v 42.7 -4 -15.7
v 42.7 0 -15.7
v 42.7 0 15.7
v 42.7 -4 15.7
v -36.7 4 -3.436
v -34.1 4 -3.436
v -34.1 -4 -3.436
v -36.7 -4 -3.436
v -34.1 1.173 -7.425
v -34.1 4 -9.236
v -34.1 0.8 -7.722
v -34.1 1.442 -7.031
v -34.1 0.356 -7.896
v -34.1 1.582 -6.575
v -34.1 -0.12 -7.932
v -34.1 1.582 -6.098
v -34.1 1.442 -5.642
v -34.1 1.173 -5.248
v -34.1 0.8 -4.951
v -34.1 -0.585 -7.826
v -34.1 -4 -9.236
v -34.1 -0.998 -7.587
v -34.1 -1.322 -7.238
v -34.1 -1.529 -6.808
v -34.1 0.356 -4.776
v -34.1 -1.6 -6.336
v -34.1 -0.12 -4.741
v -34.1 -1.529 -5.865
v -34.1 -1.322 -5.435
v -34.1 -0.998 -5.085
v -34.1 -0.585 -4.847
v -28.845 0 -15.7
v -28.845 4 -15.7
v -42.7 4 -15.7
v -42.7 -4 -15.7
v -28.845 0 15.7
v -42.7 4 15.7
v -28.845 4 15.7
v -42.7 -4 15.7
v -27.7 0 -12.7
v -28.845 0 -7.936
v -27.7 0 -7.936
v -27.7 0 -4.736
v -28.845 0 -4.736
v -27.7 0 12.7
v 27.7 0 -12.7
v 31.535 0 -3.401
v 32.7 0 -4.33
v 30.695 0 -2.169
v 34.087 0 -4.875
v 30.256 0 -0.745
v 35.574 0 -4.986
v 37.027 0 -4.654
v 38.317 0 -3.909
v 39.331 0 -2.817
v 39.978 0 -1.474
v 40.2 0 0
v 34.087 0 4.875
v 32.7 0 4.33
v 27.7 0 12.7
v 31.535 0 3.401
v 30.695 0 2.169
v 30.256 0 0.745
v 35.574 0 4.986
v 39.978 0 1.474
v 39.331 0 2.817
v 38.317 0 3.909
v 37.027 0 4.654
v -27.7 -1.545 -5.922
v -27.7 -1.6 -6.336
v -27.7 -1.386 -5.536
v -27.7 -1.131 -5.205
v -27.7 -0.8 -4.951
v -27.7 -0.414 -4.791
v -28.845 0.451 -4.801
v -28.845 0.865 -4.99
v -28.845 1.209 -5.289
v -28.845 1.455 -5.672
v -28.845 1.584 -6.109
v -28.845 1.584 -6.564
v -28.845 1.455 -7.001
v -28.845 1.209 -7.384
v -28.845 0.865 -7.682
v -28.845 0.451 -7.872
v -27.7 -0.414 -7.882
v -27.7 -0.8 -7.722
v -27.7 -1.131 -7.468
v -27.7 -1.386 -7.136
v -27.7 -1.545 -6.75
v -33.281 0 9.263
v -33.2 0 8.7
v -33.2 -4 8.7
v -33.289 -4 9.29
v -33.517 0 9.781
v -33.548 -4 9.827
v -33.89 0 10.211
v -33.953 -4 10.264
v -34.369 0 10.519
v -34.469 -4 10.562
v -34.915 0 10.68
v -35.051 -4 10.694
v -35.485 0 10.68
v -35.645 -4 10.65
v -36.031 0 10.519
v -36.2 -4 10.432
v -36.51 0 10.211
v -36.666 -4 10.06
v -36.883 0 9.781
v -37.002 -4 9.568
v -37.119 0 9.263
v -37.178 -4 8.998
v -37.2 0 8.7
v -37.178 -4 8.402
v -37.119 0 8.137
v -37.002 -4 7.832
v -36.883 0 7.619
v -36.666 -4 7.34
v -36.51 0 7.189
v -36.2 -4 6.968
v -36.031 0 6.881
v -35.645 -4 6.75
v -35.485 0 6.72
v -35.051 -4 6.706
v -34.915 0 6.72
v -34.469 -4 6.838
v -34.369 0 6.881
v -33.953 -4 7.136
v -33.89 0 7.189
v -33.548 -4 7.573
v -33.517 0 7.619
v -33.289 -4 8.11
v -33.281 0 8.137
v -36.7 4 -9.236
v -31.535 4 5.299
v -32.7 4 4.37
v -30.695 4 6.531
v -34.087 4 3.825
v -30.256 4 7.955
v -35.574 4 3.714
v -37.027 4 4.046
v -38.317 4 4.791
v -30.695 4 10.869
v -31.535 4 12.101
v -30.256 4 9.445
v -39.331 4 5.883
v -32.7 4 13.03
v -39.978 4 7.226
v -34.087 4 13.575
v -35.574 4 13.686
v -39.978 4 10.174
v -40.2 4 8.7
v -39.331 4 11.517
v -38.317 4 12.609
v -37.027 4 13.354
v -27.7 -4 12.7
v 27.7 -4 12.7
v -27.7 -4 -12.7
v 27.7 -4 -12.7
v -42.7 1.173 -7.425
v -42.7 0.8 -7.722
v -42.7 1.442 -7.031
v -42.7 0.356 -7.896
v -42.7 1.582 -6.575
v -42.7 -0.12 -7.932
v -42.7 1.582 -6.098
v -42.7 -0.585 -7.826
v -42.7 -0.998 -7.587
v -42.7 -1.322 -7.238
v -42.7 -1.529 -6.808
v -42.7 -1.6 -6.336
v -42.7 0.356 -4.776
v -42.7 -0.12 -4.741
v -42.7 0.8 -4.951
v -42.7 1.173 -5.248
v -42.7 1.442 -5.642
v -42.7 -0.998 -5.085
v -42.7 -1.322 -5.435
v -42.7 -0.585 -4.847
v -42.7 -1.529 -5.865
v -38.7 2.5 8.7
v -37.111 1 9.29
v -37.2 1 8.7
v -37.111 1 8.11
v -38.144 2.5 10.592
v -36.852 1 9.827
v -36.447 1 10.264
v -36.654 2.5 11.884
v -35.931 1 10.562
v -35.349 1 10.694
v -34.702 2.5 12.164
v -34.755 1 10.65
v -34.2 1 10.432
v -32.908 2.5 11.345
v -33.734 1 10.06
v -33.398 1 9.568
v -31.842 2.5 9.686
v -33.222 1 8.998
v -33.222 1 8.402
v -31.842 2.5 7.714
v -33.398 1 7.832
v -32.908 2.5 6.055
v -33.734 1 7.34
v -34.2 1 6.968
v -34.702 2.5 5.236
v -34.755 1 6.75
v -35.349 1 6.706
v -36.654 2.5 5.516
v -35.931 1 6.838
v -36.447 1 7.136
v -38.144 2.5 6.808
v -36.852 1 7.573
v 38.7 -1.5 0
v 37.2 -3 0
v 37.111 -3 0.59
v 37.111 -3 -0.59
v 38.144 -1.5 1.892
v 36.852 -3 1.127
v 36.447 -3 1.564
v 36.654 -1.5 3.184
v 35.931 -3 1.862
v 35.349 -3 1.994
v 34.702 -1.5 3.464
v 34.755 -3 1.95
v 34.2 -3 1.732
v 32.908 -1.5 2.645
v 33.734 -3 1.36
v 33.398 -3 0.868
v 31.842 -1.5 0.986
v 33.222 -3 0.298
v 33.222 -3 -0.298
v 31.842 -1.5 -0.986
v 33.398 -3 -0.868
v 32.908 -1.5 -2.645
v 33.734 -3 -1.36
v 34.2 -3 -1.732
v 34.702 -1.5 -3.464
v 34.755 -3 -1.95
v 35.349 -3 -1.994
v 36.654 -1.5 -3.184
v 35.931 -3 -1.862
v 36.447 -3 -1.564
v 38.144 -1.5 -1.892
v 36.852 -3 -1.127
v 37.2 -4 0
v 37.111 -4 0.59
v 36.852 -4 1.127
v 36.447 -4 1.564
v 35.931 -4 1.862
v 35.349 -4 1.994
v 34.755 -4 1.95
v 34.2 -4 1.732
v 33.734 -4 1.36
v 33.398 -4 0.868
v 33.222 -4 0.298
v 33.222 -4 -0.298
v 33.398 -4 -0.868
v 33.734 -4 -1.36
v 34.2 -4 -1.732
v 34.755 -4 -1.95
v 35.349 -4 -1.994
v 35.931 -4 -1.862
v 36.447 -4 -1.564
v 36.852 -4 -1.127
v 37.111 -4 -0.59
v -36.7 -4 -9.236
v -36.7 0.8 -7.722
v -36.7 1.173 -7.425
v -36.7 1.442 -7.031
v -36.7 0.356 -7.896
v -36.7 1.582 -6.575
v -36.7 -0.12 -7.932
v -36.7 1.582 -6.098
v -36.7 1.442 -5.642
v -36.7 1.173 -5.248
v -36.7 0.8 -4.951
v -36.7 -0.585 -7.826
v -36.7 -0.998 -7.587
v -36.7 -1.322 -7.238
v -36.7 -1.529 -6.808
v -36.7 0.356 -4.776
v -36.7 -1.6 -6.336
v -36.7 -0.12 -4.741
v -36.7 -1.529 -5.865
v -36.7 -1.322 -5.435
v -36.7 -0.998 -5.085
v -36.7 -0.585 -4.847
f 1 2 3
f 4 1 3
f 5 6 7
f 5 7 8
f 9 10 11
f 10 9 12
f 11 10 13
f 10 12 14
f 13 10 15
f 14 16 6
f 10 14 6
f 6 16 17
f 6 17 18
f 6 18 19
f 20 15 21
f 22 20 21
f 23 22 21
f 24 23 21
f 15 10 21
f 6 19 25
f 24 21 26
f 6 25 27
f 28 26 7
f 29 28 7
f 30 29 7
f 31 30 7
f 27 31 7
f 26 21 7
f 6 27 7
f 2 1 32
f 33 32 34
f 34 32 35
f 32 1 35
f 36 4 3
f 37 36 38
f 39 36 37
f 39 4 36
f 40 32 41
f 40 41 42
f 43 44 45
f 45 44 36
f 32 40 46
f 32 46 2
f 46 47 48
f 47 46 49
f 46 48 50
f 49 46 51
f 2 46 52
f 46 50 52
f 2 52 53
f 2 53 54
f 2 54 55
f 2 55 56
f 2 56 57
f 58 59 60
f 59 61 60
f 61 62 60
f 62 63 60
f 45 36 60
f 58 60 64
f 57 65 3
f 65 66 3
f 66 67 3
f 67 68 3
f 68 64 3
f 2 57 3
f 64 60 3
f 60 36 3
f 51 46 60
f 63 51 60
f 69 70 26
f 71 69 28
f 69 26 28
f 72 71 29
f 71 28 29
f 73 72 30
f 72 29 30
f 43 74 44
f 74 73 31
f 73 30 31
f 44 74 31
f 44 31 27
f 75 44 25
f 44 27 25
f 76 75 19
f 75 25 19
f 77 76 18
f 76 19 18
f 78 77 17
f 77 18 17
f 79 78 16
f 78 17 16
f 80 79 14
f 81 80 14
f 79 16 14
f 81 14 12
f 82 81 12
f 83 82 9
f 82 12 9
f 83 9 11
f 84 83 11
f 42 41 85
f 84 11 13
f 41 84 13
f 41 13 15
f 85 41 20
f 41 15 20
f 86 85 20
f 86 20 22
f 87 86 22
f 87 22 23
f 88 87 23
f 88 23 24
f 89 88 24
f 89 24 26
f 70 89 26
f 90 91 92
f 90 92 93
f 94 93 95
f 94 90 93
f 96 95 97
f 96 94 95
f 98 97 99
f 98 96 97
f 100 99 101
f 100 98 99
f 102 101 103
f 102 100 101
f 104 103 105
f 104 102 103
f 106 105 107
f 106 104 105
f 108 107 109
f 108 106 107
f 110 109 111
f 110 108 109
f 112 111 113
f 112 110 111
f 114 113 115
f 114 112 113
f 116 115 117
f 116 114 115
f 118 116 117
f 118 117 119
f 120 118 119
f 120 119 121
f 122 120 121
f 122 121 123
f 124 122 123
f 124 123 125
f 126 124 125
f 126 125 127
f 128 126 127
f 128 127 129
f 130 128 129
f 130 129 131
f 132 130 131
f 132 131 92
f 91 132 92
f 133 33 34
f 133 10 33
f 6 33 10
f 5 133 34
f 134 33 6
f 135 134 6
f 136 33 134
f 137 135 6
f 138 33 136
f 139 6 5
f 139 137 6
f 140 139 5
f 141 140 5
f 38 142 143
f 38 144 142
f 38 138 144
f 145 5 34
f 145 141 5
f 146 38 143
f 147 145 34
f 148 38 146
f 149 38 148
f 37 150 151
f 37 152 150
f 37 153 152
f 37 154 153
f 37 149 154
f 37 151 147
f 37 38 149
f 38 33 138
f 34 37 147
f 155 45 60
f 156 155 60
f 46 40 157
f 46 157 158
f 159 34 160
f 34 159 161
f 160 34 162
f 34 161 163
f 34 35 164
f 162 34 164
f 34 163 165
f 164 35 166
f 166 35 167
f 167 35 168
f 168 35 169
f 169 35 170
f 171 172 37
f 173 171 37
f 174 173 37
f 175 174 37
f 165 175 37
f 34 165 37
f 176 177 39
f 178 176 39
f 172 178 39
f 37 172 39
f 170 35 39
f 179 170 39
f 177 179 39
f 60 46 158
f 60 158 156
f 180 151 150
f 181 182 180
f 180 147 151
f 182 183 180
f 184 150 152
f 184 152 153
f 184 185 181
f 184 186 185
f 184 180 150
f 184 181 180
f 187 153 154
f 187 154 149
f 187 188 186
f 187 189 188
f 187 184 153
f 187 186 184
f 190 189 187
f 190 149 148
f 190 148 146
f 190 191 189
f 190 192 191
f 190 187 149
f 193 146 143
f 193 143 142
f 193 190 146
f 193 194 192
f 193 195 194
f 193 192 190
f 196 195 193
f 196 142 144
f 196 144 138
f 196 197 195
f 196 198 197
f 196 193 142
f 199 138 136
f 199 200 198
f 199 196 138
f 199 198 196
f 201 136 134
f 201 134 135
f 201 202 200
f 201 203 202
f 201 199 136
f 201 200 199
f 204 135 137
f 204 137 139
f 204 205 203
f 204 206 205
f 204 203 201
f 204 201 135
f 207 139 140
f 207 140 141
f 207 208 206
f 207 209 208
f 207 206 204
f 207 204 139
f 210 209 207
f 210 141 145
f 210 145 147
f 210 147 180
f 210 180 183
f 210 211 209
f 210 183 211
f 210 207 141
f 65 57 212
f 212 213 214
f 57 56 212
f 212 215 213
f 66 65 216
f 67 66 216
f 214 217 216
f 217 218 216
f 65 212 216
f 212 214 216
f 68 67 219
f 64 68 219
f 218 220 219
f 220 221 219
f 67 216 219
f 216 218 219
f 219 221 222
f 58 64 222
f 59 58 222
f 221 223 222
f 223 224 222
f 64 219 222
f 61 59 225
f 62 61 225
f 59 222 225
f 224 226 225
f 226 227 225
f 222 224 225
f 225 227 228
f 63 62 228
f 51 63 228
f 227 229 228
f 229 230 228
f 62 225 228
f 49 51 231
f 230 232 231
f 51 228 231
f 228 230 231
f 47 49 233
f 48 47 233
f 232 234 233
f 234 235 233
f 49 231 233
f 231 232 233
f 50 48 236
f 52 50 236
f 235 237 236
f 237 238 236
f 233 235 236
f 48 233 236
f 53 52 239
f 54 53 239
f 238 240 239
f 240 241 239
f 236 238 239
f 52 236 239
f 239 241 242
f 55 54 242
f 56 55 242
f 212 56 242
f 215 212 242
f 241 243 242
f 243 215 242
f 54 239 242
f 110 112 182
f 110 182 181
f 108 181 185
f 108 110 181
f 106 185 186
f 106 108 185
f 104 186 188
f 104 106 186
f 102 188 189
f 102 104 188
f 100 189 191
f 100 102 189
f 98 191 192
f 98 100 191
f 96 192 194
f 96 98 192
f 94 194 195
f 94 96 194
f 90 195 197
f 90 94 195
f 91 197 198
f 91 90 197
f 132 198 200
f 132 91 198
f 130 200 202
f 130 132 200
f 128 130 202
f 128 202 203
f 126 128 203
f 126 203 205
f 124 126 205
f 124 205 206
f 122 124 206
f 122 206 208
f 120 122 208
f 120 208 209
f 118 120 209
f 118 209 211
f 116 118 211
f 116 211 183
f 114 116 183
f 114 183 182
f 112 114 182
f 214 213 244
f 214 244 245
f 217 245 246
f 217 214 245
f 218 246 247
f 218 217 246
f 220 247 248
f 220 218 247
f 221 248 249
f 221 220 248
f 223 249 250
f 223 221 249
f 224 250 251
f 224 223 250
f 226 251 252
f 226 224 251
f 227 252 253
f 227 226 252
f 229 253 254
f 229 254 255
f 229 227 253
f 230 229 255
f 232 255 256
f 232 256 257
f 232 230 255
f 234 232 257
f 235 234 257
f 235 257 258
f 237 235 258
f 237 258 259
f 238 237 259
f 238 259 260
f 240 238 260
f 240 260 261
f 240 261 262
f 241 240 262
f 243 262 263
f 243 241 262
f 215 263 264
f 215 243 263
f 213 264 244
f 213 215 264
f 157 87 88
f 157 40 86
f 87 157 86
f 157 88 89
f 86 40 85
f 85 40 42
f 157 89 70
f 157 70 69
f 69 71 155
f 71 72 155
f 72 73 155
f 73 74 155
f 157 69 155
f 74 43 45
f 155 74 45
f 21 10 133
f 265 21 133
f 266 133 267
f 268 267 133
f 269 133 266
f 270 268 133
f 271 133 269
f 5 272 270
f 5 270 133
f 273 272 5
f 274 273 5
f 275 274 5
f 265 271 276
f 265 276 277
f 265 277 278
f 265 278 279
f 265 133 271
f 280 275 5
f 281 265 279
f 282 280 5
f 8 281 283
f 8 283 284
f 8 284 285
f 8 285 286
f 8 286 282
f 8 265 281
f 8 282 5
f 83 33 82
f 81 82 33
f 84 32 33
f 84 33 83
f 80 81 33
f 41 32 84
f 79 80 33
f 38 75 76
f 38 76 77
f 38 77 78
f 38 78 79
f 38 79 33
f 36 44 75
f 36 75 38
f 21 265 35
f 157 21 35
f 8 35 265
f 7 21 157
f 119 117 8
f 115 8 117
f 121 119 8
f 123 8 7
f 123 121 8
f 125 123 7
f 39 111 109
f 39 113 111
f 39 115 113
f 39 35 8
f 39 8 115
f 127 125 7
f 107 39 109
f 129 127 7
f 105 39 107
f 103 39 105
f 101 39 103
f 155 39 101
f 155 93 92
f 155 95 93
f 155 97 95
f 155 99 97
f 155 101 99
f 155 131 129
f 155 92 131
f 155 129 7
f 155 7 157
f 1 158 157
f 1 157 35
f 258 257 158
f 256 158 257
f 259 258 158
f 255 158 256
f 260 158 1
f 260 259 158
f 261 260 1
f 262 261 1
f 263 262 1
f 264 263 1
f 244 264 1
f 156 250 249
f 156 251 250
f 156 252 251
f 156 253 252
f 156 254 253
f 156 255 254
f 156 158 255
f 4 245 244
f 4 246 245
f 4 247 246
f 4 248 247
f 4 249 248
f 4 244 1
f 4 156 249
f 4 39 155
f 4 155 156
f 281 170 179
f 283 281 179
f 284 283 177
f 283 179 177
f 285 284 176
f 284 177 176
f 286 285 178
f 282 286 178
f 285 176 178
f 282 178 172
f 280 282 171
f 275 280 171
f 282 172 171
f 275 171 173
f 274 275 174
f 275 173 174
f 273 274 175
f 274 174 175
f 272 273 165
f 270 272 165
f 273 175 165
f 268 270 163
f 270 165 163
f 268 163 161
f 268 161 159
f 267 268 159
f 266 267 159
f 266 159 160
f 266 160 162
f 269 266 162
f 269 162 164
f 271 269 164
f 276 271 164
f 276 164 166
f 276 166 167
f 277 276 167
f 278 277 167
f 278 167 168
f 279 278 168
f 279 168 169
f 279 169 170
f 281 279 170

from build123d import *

# Parameters (mm, degrees)
F0_W     = 85.4
F0_H     = 31.4
F0_W_2   = 2.6
F0_H_2   = 5.8
F0_R     = 2
F0_W_3   = 55.4
F0_H_3   = 25.4
F1_DEPTH = 4
F2_W     = 13.854876
F2_H     = 31.4
F2_W_2   = 2.6
F2_H_2   = 5.8
F2_R     = 2
F3_DEPTH = 4
F4_R     = 1.6
F5_DEPTH = 25
F6_SIZE  = 3


with BuildPart() as f1:
    # F0 (on Front) → F1 (new body)
    with BuildSketch(Plane.XZ):
        Rectangle(F0_W, F0_H)
        with Locations((-35.4, -6.336361)):
            Rectangle(F0_W_2, F0_H_2, mode=Mode.SUBTRACT)
        with Locations((-35.2, 8.7)):
            Circle(F0_R, mode=Mode.SUBTRACT)
        Rectangle(F0_W_3, F0_H_3, mode=Mode.SUBTRACT)
        with Locations((35.2, 0)):
            Circle(F0_R, mode=Mode.SUBTRACT)
    extrude(amount=F1_DEPTH)

    # F2 (on face) → F3 (join)
    with BuildSketch(Plane(origin=(0, 0, 0), x_dir=(-1, 0, 0), z_dir=(0, 1, 0))):
        with Locations((35.772562, 0)):
            Rectangle(F2_W, F2_H)
        with Locations((35.4, -6.336361)):
            Rectangle(F2_W_2, F2_H_2, mode=Mode.SUBTRACT)
        with Locations((35.2, 8.7)):
            Circle(F2_R, mode=Mode.SUBTRACT)
    extrude(amount=F3_DEPTH)

    # F4 (on face) → F5 (cut)
    with BuildSketch(Plane(origin=(-42.7, 0, 0), x_dir=(0, -1, 0), z_dir=(-1, 0, 0))):
        with Locations((0, -6.336361)):
            Circle(F4_R)
    extrude(amount=-F5_DEPTH, mode=Mode.SUBTRACT)

    # F6
    f6_edges = [f1.edges().sort_by_distance(p)[0] for p in [
        (-33.2, 4, 8.7),
        (33.2, 0, 0),
    ]]
    chamfer(f6_edges, length=F6_SIZE)


solid = f1.part
